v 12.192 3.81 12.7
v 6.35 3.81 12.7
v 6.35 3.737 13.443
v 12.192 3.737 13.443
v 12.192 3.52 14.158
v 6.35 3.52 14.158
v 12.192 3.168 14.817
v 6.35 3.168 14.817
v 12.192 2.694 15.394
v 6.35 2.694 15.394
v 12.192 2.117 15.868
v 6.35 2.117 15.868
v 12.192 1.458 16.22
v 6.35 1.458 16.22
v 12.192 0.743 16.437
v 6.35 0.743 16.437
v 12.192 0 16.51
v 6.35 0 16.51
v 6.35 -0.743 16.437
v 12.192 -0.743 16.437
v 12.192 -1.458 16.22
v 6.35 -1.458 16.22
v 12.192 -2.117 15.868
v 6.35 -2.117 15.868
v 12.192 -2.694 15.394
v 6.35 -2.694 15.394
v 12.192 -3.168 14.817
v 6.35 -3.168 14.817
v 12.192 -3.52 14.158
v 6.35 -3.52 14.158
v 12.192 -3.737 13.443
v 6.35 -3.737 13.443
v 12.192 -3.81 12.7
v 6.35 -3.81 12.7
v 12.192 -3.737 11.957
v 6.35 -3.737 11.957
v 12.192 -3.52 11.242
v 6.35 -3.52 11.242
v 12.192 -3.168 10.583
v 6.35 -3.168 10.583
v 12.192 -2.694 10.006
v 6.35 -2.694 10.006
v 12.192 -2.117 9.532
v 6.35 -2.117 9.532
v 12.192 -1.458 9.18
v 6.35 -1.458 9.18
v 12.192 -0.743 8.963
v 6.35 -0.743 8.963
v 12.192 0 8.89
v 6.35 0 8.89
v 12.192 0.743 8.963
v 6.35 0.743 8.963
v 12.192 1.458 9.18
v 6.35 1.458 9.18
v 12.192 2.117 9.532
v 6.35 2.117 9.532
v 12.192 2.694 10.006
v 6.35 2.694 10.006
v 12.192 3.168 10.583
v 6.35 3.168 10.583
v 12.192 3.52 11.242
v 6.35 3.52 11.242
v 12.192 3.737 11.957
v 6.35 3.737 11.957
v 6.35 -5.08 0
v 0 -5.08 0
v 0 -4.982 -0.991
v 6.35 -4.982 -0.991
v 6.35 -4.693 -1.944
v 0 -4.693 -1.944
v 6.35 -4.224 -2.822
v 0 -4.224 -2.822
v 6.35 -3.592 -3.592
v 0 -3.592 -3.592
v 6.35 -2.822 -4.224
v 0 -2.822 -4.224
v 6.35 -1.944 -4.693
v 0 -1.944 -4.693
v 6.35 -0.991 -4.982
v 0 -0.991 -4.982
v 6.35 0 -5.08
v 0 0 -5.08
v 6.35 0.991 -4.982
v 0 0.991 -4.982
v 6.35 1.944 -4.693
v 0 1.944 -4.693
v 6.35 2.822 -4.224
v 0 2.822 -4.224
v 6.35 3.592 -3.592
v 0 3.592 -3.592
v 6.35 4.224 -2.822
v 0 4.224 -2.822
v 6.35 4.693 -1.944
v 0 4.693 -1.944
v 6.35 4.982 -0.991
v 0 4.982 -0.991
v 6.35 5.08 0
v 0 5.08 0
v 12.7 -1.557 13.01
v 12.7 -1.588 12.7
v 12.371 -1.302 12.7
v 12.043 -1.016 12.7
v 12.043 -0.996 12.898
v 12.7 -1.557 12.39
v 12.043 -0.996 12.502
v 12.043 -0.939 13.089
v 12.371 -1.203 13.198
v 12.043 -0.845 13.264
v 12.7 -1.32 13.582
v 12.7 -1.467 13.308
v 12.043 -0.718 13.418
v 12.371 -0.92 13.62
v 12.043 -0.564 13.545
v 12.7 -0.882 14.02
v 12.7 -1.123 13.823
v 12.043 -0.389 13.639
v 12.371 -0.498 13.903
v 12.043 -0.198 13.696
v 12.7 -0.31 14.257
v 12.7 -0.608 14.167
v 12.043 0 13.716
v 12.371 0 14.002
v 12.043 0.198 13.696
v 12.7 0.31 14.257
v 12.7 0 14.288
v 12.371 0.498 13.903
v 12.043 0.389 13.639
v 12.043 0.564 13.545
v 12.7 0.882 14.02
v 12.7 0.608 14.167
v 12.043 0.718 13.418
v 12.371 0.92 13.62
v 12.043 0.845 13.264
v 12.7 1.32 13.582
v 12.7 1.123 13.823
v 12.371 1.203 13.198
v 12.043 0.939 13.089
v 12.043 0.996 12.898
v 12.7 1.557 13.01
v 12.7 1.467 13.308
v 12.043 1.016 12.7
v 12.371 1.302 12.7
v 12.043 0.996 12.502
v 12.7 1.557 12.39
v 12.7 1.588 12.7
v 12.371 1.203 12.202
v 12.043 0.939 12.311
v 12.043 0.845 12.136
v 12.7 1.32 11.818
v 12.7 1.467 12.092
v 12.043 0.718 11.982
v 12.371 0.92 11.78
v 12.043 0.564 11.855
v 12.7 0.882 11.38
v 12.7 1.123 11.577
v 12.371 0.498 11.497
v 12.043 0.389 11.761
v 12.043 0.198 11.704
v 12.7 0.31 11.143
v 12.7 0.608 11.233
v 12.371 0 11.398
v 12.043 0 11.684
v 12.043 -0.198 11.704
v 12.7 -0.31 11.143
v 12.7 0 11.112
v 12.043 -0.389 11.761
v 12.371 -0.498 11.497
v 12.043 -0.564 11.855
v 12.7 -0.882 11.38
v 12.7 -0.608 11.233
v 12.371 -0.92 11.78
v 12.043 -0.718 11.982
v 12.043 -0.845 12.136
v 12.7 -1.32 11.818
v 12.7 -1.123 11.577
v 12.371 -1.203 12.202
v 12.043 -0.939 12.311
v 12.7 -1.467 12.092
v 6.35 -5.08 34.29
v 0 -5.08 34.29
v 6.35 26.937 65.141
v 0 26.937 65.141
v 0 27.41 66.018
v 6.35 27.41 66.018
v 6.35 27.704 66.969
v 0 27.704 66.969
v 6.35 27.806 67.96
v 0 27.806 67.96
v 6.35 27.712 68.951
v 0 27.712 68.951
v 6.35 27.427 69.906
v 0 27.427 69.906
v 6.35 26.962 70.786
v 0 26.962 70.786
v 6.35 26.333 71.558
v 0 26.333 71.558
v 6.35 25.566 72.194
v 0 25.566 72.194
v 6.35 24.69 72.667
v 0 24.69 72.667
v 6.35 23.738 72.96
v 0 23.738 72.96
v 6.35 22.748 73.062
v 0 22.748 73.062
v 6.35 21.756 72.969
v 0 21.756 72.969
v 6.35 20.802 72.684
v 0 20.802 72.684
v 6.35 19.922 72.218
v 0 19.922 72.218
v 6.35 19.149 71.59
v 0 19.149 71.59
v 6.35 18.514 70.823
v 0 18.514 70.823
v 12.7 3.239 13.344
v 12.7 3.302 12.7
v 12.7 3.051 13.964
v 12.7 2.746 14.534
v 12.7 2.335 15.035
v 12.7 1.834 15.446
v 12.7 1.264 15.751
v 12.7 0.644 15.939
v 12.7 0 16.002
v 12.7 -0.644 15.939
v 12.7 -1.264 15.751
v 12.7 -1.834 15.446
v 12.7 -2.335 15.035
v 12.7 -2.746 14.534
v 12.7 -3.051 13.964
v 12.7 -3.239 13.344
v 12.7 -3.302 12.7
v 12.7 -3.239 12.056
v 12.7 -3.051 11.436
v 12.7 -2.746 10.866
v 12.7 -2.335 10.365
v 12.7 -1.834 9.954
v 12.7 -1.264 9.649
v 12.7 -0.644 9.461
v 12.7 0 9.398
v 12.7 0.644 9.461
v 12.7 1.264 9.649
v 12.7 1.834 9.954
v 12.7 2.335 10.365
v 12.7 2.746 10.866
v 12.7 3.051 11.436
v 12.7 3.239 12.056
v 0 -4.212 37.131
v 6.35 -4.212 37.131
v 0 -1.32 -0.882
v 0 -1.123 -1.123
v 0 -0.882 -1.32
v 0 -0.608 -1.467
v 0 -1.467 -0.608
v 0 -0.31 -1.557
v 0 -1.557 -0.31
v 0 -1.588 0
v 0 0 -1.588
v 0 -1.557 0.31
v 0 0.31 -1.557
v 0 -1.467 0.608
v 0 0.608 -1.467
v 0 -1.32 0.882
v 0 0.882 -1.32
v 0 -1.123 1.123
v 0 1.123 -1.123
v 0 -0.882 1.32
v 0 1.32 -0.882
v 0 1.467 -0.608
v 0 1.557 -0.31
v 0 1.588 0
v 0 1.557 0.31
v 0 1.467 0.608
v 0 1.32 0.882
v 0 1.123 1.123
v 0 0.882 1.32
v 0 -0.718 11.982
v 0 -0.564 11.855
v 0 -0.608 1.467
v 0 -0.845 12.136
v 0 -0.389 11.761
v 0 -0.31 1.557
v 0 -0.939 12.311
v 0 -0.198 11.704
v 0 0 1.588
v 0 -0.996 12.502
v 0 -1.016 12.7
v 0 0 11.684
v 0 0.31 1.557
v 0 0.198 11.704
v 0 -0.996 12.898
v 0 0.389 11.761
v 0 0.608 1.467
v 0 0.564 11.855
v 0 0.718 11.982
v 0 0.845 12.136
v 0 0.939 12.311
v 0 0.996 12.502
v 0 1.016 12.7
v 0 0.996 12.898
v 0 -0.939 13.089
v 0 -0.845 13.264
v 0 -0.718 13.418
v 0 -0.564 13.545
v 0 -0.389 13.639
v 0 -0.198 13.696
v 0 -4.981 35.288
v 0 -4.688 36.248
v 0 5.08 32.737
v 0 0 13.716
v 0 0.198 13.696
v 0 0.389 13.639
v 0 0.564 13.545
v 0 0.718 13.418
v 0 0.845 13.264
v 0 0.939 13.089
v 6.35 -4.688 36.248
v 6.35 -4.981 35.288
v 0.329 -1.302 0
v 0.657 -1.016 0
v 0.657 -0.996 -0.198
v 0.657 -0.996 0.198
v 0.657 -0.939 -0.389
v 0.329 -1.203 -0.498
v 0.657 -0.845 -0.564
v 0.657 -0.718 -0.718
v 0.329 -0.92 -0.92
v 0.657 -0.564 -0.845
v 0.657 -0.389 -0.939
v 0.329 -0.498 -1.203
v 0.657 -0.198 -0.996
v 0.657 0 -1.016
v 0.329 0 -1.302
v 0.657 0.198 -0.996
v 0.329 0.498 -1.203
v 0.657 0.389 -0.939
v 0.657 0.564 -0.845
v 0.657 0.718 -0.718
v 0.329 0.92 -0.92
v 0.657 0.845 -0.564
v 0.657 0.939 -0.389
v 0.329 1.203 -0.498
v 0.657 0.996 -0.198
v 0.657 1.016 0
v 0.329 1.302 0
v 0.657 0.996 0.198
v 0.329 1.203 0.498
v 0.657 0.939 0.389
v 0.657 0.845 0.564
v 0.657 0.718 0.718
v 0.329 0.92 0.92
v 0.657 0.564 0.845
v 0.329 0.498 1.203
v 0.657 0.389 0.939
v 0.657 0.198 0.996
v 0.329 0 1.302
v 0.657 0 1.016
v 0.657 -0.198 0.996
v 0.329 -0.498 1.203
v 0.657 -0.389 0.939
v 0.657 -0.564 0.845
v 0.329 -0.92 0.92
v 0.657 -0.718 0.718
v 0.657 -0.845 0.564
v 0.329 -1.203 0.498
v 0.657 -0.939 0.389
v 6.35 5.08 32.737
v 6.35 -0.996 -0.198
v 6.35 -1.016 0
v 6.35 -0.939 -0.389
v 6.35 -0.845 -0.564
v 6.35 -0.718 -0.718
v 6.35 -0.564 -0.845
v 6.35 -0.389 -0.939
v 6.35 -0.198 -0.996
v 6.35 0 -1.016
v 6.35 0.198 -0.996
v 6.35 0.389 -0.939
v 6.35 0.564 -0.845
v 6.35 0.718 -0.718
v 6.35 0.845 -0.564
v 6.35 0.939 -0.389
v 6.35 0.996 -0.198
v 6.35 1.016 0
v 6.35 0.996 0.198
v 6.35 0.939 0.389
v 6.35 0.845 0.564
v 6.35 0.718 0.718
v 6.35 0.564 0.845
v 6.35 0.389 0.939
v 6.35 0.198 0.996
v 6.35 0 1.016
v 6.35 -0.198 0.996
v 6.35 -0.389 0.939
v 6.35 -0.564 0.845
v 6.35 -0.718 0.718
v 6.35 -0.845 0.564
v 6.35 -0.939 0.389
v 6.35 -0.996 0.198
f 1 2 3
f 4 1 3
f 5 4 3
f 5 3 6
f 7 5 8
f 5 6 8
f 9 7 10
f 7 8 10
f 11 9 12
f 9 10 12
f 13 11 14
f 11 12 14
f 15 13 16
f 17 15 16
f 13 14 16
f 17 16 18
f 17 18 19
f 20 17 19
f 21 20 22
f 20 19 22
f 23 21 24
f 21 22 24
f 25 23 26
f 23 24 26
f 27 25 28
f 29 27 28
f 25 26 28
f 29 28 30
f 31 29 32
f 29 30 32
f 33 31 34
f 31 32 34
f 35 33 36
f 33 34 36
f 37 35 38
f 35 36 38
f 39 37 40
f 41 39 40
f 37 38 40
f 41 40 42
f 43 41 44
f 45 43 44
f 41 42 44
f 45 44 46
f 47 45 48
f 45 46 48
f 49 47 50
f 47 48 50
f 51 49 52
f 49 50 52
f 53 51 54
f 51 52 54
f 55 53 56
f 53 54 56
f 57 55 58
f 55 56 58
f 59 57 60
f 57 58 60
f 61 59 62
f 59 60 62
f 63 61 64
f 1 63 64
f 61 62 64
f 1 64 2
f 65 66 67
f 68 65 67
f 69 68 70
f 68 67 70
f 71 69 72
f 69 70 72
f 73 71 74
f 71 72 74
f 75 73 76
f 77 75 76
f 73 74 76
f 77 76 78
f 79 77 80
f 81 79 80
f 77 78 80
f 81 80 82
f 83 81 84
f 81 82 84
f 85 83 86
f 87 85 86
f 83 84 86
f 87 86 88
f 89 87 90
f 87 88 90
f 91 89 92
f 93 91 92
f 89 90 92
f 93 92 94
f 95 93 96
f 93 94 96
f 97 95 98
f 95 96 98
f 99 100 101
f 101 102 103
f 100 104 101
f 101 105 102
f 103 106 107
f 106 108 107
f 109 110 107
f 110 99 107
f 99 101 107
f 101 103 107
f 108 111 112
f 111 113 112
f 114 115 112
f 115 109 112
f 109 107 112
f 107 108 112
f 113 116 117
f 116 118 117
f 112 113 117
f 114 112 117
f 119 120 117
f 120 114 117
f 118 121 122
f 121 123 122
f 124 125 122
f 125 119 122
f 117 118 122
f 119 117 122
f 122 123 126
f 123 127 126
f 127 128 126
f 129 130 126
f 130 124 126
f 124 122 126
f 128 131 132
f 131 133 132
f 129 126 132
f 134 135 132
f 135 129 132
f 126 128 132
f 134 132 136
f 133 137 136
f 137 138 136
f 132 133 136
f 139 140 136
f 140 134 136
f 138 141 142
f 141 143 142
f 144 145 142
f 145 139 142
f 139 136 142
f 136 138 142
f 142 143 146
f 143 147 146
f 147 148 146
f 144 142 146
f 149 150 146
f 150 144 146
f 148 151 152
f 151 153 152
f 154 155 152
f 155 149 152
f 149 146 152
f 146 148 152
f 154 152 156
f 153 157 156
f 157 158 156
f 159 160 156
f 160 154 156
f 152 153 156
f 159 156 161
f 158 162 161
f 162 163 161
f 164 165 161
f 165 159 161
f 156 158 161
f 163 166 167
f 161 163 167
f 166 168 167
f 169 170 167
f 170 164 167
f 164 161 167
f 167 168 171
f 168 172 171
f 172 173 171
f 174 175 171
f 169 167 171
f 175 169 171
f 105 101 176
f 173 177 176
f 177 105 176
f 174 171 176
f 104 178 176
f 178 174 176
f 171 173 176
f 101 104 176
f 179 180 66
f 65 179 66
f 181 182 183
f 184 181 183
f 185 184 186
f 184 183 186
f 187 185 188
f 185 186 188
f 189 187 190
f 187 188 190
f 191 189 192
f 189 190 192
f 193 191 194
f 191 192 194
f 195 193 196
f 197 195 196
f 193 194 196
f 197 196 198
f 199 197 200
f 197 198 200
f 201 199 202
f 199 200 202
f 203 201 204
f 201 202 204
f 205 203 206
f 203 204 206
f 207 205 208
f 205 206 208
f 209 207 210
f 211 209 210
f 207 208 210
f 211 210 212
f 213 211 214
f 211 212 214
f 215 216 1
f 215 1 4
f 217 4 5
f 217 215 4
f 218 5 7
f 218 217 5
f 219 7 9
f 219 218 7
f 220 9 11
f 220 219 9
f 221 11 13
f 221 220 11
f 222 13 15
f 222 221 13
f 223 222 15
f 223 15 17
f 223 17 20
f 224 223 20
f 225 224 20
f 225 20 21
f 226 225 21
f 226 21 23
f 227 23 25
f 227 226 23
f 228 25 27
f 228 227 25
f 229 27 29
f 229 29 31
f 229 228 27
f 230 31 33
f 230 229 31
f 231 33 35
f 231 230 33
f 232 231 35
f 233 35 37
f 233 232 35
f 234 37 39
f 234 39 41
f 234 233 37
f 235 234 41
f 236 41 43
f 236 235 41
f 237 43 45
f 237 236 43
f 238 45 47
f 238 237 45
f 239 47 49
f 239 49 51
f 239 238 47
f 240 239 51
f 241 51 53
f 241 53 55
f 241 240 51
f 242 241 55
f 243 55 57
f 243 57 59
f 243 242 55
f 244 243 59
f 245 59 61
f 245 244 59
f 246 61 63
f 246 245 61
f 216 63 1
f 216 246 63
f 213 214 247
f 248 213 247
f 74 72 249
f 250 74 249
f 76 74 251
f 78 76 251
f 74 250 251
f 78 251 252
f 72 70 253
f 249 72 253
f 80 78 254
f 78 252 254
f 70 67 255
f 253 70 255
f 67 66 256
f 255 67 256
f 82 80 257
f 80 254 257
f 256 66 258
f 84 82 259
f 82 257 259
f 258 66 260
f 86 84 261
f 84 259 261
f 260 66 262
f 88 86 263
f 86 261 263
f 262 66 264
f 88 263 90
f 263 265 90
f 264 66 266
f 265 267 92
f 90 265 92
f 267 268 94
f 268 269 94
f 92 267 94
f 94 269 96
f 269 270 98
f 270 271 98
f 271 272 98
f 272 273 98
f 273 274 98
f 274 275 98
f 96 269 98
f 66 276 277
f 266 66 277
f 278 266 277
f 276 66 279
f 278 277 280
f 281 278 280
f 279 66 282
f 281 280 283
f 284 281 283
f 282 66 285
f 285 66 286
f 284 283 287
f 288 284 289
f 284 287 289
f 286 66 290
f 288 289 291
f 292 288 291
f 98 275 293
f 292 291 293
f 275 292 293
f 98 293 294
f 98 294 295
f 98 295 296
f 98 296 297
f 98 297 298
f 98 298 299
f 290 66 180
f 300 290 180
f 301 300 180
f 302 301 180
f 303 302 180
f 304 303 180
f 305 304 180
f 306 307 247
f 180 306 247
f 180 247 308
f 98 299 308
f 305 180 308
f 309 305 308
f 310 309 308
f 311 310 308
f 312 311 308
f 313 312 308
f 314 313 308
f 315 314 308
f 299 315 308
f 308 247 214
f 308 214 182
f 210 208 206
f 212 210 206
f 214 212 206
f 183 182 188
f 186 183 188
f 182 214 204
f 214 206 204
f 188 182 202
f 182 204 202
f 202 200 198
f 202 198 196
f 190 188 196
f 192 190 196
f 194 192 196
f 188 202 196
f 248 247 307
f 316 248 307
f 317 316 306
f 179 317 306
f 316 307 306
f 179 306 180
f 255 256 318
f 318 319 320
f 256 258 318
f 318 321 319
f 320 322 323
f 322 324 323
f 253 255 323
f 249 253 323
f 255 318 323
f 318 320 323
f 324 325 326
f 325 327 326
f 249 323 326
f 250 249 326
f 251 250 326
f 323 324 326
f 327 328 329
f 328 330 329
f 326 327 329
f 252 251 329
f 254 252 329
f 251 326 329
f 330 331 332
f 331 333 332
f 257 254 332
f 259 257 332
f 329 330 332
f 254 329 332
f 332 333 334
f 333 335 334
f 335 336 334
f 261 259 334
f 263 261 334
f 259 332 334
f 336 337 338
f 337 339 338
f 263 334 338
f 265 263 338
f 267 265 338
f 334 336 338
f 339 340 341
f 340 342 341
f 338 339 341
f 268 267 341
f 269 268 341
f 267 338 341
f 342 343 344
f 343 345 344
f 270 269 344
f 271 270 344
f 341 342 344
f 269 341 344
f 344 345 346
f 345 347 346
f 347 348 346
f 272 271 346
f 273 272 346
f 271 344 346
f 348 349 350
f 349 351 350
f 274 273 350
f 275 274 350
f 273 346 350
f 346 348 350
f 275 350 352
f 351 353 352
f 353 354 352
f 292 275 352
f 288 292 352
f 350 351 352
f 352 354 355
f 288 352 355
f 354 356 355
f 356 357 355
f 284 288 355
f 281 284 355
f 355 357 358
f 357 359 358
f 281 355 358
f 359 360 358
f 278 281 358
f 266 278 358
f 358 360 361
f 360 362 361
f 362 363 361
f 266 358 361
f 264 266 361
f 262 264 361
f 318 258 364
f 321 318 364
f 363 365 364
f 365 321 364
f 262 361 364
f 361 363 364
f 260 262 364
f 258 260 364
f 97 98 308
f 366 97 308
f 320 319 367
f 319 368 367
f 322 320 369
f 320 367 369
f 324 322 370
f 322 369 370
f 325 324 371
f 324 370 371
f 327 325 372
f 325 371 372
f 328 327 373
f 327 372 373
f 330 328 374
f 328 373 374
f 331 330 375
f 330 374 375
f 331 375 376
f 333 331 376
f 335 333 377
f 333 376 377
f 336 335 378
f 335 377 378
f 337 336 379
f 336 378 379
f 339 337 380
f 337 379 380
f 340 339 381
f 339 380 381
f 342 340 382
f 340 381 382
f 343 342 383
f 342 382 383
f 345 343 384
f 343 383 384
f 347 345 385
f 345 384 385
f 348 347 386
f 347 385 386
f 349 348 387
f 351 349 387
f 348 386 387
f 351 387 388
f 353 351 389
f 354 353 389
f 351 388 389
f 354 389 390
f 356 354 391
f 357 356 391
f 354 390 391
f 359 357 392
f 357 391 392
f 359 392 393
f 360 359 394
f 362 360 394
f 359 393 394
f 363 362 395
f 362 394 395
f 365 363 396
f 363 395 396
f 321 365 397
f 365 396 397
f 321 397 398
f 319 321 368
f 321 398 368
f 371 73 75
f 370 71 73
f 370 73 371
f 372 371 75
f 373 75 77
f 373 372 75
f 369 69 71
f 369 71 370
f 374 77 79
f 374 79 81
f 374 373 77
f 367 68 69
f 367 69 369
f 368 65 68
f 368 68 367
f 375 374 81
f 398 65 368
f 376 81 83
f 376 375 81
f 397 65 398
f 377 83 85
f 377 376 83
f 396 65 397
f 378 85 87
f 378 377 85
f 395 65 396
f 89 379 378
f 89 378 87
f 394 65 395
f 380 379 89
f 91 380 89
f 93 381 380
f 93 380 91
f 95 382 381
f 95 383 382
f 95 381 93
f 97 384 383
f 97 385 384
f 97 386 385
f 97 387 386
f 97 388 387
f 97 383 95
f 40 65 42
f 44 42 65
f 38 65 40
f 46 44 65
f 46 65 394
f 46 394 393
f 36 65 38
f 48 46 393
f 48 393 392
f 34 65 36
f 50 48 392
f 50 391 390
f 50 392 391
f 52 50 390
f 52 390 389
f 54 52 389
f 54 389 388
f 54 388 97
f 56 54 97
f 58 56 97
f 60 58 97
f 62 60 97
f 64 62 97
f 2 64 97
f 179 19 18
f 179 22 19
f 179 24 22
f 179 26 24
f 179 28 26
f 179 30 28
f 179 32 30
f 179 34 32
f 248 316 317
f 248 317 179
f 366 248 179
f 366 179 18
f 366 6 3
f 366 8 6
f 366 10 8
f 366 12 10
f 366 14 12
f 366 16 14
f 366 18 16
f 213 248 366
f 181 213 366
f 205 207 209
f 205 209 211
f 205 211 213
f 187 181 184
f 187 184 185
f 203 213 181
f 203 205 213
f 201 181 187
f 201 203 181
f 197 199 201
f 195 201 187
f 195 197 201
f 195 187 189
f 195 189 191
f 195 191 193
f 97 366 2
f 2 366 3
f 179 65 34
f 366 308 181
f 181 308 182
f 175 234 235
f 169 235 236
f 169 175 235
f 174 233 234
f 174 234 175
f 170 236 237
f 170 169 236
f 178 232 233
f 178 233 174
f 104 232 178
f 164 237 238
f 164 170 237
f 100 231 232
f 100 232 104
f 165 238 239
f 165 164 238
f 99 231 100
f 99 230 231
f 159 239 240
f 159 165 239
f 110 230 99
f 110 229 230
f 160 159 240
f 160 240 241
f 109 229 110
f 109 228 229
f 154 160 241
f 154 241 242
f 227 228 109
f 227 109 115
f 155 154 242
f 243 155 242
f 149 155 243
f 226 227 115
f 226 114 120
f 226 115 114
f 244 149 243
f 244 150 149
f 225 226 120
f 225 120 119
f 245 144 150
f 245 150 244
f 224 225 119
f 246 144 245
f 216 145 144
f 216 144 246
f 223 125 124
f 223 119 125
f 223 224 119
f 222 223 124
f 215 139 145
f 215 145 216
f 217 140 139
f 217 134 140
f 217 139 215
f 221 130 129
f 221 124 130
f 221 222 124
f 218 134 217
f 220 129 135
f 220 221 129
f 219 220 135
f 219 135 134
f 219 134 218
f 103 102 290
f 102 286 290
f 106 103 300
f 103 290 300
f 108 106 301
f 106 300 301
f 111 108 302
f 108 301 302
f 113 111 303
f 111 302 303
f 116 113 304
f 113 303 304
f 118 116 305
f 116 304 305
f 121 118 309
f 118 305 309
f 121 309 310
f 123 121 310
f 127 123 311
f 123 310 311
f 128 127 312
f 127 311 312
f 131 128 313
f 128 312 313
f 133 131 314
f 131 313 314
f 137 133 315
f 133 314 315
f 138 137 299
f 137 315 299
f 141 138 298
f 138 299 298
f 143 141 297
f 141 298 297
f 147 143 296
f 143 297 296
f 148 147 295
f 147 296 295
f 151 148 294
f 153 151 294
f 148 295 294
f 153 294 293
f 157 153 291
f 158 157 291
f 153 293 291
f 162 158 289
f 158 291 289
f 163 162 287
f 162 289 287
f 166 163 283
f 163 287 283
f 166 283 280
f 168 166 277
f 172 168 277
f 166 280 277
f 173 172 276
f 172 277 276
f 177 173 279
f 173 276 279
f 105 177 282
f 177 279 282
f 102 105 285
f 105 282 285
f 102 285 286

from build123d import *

# Parameters (mm, degrees)
F1_DEPTH       = 6.35
F2_R           = 3.81
F3_DEPTH       = 6.35
F5_D           = 2.032
F5_CSINK_D     = 3.175
F5_CSINK_ANGLE = 82
F6_D           = 2.032
F6_CSINK_D     = 3.175
F6_CSINK_ANGLE = 82
F7_SIZE        = 0.508


with BuildPart() as f1:
    # F0 (on Right) → F1 (new body)
    with BuildSketch(Plane.YZ):
        with BuildLine():
            ThreePointArc((-5.08, 12.7), (-3.5921024484, 9.1078975516), (0, 7.62))
            Line((0, 7.62), (0, 12.7))
            Line((0, 12.7), (0, 17.78))
            ThreePointArc((0, 17.78), (-3.5921024484, 16.2921024484), (-5.08, 12.7))
        make_face()
        with BuildLine():
            Line((0, 12.7), (0, 7.62))
            ThreePointArc((0, 7.62), (3.5921024484, 9.1078975516), (5.08, 12.7))
            ThreePointArc((5.08, 12.7), (3.5921024484, 16.2921024484), (0, 17.78))
            Line((0, 17.78), (0, 12.7))
        make_face()
        with BuildLine():
            ThreePointArc((5.08, 12.7), (3.5921024484, 9.1078975516), (0, 7.62))
            ThreePointArc((0, 7.62), (-3.5921024484, 9.1078975516), (-5.08, 12.7))
            Line((-5.08, 12.7), (-5.08, 0))
            ThreePointArc((-5.08, 0), (0, -5.08), (5.08, 0))
            Line((5.08, 0), (5.08, 12.7))
        make_face()
        with BuildLine():
            ThreePointArc((0, 17.78), (3.5921024484, 16.2921024484), (5.08, 12.7))
            Line((5.08, 12.7), (5.08, 32.7368881382))
            Line((5.08, 32.7368881382), (4.2115108686, 31.4493000504))
            ThreePointArc((4.2115108686, 31.4493000504), (2.384915539, 29.8046262283), (0, 29.21))
            Line((0, 29.21), (0, 17.78))
        make_face()
        with BuildLine():
            Line((-5.08, 34.29), (-5.08, 12.7))
            ThreePointArc((-5.08, 12.7), (-3.5921024484, 16.2921024484), (0, 17.78))
            Line((0, 17.78), (0, 29.21))
            ThreePointArc((0, 29.21), (-3.5921024484, 30.6978975516), (-5.08, 34.29))
        make_face()
        with BuildLine():
            Line((4.2115108686, 31.4493000504), (5.08, 32.7368881382))
            Line((5.08, 32.7368881382), (5.08, 34.29))
            ThreePointArc((5.08, 34.29), (4.4853737717, 36.674915539), (2.8406999496, 38.5015108686))
            Line((2.8406999496, 38.5015108686), (0, 34.29))
            Line((0, 34.29), (0, 29.21))
            ThreePointArc((0, 29.21), (2.384915539, 29.8046262283), (4.2115108686, 31.4493000504))
        make_face()
        with BuildLine():
            Line((5.08, 34.29), (5.08, 32.7368881382))
            Line((5.08, 32.7368881382), (26.9371104656, 65.141386999))
            ThreePointArc((26.9371104656, 65.141386999), (25.5662995467, 72.1935978172), (18.5140887285, 70.8227868983))
            Line((18.5140887285, 70.8227868983), (-4.2115108686, 37.1306999496))
            ThreePointArc((-4.2115108686, 37.1306999496), (-0.9693096965, 39.2766660919), (2.8406999496, 38.5015108686))
            ThreePointArc((2.8406999496, 38.5015108686), (4.4853737717, 36.674915539), (5.08, 34.29))
        make_face()
        with BuildLine():
            ThreePointArc((-4.2115108686, 37.1306999496), (-4.8580281603, 35.77524826), (-5.08, 34.29))
            ThreePointArc((-5.08, 34.29), (-3.5921024484, 30.6978975516), (0, 29.21))
            Line((0, 29.21), (0, 34.29))
            Line((0, 34.29), (2.8406999496, 38.5015108686))
            ThreePointArc((2.8406999496, 38.5015108686), (-0.9693096965, 39.2766660919), (-4.2115108686, 37.1306999496))
        make_face()
    extrude(amount=F1_DEPTH)

    # F2 (on face) → F3 (join)
    with BuildSketch(Plane.YZ.offset(6.35)):
        with Locations((0, 12.7)):
            Circle(F2_R)
    extrude(amount=F3_DEPTH)

    # F5 (through all)
    with Locations(Plane.YZ.offset(12.7)):
        with Locations((0, 12.7)):
            CounterSinkHole(F5_D / 2, F5_CSINK_D / 2, counter_sink_angle=F5_CSINK_ANGLE)

    # F6 (through all)
    with Locations(Plane(origin=(0, 0, 0), x_dir=(0, 1, 0), z_dir=(-1, 0, 0))):
        with Locations((0, 0)):
            CounterSinkHole(F6_D / 2, F6_CSINK_D / 2, counter_sink_angle=F6_CSINK_ANGLE)

    # F7
    f7_edges = [f1.edges().sort_by_distance(p)[0] for p in [
        (12.7, -3.81, 12.7),
    ]]
    chamfer(f7_edges, length=F7_SIZE)


solid = f1.part
